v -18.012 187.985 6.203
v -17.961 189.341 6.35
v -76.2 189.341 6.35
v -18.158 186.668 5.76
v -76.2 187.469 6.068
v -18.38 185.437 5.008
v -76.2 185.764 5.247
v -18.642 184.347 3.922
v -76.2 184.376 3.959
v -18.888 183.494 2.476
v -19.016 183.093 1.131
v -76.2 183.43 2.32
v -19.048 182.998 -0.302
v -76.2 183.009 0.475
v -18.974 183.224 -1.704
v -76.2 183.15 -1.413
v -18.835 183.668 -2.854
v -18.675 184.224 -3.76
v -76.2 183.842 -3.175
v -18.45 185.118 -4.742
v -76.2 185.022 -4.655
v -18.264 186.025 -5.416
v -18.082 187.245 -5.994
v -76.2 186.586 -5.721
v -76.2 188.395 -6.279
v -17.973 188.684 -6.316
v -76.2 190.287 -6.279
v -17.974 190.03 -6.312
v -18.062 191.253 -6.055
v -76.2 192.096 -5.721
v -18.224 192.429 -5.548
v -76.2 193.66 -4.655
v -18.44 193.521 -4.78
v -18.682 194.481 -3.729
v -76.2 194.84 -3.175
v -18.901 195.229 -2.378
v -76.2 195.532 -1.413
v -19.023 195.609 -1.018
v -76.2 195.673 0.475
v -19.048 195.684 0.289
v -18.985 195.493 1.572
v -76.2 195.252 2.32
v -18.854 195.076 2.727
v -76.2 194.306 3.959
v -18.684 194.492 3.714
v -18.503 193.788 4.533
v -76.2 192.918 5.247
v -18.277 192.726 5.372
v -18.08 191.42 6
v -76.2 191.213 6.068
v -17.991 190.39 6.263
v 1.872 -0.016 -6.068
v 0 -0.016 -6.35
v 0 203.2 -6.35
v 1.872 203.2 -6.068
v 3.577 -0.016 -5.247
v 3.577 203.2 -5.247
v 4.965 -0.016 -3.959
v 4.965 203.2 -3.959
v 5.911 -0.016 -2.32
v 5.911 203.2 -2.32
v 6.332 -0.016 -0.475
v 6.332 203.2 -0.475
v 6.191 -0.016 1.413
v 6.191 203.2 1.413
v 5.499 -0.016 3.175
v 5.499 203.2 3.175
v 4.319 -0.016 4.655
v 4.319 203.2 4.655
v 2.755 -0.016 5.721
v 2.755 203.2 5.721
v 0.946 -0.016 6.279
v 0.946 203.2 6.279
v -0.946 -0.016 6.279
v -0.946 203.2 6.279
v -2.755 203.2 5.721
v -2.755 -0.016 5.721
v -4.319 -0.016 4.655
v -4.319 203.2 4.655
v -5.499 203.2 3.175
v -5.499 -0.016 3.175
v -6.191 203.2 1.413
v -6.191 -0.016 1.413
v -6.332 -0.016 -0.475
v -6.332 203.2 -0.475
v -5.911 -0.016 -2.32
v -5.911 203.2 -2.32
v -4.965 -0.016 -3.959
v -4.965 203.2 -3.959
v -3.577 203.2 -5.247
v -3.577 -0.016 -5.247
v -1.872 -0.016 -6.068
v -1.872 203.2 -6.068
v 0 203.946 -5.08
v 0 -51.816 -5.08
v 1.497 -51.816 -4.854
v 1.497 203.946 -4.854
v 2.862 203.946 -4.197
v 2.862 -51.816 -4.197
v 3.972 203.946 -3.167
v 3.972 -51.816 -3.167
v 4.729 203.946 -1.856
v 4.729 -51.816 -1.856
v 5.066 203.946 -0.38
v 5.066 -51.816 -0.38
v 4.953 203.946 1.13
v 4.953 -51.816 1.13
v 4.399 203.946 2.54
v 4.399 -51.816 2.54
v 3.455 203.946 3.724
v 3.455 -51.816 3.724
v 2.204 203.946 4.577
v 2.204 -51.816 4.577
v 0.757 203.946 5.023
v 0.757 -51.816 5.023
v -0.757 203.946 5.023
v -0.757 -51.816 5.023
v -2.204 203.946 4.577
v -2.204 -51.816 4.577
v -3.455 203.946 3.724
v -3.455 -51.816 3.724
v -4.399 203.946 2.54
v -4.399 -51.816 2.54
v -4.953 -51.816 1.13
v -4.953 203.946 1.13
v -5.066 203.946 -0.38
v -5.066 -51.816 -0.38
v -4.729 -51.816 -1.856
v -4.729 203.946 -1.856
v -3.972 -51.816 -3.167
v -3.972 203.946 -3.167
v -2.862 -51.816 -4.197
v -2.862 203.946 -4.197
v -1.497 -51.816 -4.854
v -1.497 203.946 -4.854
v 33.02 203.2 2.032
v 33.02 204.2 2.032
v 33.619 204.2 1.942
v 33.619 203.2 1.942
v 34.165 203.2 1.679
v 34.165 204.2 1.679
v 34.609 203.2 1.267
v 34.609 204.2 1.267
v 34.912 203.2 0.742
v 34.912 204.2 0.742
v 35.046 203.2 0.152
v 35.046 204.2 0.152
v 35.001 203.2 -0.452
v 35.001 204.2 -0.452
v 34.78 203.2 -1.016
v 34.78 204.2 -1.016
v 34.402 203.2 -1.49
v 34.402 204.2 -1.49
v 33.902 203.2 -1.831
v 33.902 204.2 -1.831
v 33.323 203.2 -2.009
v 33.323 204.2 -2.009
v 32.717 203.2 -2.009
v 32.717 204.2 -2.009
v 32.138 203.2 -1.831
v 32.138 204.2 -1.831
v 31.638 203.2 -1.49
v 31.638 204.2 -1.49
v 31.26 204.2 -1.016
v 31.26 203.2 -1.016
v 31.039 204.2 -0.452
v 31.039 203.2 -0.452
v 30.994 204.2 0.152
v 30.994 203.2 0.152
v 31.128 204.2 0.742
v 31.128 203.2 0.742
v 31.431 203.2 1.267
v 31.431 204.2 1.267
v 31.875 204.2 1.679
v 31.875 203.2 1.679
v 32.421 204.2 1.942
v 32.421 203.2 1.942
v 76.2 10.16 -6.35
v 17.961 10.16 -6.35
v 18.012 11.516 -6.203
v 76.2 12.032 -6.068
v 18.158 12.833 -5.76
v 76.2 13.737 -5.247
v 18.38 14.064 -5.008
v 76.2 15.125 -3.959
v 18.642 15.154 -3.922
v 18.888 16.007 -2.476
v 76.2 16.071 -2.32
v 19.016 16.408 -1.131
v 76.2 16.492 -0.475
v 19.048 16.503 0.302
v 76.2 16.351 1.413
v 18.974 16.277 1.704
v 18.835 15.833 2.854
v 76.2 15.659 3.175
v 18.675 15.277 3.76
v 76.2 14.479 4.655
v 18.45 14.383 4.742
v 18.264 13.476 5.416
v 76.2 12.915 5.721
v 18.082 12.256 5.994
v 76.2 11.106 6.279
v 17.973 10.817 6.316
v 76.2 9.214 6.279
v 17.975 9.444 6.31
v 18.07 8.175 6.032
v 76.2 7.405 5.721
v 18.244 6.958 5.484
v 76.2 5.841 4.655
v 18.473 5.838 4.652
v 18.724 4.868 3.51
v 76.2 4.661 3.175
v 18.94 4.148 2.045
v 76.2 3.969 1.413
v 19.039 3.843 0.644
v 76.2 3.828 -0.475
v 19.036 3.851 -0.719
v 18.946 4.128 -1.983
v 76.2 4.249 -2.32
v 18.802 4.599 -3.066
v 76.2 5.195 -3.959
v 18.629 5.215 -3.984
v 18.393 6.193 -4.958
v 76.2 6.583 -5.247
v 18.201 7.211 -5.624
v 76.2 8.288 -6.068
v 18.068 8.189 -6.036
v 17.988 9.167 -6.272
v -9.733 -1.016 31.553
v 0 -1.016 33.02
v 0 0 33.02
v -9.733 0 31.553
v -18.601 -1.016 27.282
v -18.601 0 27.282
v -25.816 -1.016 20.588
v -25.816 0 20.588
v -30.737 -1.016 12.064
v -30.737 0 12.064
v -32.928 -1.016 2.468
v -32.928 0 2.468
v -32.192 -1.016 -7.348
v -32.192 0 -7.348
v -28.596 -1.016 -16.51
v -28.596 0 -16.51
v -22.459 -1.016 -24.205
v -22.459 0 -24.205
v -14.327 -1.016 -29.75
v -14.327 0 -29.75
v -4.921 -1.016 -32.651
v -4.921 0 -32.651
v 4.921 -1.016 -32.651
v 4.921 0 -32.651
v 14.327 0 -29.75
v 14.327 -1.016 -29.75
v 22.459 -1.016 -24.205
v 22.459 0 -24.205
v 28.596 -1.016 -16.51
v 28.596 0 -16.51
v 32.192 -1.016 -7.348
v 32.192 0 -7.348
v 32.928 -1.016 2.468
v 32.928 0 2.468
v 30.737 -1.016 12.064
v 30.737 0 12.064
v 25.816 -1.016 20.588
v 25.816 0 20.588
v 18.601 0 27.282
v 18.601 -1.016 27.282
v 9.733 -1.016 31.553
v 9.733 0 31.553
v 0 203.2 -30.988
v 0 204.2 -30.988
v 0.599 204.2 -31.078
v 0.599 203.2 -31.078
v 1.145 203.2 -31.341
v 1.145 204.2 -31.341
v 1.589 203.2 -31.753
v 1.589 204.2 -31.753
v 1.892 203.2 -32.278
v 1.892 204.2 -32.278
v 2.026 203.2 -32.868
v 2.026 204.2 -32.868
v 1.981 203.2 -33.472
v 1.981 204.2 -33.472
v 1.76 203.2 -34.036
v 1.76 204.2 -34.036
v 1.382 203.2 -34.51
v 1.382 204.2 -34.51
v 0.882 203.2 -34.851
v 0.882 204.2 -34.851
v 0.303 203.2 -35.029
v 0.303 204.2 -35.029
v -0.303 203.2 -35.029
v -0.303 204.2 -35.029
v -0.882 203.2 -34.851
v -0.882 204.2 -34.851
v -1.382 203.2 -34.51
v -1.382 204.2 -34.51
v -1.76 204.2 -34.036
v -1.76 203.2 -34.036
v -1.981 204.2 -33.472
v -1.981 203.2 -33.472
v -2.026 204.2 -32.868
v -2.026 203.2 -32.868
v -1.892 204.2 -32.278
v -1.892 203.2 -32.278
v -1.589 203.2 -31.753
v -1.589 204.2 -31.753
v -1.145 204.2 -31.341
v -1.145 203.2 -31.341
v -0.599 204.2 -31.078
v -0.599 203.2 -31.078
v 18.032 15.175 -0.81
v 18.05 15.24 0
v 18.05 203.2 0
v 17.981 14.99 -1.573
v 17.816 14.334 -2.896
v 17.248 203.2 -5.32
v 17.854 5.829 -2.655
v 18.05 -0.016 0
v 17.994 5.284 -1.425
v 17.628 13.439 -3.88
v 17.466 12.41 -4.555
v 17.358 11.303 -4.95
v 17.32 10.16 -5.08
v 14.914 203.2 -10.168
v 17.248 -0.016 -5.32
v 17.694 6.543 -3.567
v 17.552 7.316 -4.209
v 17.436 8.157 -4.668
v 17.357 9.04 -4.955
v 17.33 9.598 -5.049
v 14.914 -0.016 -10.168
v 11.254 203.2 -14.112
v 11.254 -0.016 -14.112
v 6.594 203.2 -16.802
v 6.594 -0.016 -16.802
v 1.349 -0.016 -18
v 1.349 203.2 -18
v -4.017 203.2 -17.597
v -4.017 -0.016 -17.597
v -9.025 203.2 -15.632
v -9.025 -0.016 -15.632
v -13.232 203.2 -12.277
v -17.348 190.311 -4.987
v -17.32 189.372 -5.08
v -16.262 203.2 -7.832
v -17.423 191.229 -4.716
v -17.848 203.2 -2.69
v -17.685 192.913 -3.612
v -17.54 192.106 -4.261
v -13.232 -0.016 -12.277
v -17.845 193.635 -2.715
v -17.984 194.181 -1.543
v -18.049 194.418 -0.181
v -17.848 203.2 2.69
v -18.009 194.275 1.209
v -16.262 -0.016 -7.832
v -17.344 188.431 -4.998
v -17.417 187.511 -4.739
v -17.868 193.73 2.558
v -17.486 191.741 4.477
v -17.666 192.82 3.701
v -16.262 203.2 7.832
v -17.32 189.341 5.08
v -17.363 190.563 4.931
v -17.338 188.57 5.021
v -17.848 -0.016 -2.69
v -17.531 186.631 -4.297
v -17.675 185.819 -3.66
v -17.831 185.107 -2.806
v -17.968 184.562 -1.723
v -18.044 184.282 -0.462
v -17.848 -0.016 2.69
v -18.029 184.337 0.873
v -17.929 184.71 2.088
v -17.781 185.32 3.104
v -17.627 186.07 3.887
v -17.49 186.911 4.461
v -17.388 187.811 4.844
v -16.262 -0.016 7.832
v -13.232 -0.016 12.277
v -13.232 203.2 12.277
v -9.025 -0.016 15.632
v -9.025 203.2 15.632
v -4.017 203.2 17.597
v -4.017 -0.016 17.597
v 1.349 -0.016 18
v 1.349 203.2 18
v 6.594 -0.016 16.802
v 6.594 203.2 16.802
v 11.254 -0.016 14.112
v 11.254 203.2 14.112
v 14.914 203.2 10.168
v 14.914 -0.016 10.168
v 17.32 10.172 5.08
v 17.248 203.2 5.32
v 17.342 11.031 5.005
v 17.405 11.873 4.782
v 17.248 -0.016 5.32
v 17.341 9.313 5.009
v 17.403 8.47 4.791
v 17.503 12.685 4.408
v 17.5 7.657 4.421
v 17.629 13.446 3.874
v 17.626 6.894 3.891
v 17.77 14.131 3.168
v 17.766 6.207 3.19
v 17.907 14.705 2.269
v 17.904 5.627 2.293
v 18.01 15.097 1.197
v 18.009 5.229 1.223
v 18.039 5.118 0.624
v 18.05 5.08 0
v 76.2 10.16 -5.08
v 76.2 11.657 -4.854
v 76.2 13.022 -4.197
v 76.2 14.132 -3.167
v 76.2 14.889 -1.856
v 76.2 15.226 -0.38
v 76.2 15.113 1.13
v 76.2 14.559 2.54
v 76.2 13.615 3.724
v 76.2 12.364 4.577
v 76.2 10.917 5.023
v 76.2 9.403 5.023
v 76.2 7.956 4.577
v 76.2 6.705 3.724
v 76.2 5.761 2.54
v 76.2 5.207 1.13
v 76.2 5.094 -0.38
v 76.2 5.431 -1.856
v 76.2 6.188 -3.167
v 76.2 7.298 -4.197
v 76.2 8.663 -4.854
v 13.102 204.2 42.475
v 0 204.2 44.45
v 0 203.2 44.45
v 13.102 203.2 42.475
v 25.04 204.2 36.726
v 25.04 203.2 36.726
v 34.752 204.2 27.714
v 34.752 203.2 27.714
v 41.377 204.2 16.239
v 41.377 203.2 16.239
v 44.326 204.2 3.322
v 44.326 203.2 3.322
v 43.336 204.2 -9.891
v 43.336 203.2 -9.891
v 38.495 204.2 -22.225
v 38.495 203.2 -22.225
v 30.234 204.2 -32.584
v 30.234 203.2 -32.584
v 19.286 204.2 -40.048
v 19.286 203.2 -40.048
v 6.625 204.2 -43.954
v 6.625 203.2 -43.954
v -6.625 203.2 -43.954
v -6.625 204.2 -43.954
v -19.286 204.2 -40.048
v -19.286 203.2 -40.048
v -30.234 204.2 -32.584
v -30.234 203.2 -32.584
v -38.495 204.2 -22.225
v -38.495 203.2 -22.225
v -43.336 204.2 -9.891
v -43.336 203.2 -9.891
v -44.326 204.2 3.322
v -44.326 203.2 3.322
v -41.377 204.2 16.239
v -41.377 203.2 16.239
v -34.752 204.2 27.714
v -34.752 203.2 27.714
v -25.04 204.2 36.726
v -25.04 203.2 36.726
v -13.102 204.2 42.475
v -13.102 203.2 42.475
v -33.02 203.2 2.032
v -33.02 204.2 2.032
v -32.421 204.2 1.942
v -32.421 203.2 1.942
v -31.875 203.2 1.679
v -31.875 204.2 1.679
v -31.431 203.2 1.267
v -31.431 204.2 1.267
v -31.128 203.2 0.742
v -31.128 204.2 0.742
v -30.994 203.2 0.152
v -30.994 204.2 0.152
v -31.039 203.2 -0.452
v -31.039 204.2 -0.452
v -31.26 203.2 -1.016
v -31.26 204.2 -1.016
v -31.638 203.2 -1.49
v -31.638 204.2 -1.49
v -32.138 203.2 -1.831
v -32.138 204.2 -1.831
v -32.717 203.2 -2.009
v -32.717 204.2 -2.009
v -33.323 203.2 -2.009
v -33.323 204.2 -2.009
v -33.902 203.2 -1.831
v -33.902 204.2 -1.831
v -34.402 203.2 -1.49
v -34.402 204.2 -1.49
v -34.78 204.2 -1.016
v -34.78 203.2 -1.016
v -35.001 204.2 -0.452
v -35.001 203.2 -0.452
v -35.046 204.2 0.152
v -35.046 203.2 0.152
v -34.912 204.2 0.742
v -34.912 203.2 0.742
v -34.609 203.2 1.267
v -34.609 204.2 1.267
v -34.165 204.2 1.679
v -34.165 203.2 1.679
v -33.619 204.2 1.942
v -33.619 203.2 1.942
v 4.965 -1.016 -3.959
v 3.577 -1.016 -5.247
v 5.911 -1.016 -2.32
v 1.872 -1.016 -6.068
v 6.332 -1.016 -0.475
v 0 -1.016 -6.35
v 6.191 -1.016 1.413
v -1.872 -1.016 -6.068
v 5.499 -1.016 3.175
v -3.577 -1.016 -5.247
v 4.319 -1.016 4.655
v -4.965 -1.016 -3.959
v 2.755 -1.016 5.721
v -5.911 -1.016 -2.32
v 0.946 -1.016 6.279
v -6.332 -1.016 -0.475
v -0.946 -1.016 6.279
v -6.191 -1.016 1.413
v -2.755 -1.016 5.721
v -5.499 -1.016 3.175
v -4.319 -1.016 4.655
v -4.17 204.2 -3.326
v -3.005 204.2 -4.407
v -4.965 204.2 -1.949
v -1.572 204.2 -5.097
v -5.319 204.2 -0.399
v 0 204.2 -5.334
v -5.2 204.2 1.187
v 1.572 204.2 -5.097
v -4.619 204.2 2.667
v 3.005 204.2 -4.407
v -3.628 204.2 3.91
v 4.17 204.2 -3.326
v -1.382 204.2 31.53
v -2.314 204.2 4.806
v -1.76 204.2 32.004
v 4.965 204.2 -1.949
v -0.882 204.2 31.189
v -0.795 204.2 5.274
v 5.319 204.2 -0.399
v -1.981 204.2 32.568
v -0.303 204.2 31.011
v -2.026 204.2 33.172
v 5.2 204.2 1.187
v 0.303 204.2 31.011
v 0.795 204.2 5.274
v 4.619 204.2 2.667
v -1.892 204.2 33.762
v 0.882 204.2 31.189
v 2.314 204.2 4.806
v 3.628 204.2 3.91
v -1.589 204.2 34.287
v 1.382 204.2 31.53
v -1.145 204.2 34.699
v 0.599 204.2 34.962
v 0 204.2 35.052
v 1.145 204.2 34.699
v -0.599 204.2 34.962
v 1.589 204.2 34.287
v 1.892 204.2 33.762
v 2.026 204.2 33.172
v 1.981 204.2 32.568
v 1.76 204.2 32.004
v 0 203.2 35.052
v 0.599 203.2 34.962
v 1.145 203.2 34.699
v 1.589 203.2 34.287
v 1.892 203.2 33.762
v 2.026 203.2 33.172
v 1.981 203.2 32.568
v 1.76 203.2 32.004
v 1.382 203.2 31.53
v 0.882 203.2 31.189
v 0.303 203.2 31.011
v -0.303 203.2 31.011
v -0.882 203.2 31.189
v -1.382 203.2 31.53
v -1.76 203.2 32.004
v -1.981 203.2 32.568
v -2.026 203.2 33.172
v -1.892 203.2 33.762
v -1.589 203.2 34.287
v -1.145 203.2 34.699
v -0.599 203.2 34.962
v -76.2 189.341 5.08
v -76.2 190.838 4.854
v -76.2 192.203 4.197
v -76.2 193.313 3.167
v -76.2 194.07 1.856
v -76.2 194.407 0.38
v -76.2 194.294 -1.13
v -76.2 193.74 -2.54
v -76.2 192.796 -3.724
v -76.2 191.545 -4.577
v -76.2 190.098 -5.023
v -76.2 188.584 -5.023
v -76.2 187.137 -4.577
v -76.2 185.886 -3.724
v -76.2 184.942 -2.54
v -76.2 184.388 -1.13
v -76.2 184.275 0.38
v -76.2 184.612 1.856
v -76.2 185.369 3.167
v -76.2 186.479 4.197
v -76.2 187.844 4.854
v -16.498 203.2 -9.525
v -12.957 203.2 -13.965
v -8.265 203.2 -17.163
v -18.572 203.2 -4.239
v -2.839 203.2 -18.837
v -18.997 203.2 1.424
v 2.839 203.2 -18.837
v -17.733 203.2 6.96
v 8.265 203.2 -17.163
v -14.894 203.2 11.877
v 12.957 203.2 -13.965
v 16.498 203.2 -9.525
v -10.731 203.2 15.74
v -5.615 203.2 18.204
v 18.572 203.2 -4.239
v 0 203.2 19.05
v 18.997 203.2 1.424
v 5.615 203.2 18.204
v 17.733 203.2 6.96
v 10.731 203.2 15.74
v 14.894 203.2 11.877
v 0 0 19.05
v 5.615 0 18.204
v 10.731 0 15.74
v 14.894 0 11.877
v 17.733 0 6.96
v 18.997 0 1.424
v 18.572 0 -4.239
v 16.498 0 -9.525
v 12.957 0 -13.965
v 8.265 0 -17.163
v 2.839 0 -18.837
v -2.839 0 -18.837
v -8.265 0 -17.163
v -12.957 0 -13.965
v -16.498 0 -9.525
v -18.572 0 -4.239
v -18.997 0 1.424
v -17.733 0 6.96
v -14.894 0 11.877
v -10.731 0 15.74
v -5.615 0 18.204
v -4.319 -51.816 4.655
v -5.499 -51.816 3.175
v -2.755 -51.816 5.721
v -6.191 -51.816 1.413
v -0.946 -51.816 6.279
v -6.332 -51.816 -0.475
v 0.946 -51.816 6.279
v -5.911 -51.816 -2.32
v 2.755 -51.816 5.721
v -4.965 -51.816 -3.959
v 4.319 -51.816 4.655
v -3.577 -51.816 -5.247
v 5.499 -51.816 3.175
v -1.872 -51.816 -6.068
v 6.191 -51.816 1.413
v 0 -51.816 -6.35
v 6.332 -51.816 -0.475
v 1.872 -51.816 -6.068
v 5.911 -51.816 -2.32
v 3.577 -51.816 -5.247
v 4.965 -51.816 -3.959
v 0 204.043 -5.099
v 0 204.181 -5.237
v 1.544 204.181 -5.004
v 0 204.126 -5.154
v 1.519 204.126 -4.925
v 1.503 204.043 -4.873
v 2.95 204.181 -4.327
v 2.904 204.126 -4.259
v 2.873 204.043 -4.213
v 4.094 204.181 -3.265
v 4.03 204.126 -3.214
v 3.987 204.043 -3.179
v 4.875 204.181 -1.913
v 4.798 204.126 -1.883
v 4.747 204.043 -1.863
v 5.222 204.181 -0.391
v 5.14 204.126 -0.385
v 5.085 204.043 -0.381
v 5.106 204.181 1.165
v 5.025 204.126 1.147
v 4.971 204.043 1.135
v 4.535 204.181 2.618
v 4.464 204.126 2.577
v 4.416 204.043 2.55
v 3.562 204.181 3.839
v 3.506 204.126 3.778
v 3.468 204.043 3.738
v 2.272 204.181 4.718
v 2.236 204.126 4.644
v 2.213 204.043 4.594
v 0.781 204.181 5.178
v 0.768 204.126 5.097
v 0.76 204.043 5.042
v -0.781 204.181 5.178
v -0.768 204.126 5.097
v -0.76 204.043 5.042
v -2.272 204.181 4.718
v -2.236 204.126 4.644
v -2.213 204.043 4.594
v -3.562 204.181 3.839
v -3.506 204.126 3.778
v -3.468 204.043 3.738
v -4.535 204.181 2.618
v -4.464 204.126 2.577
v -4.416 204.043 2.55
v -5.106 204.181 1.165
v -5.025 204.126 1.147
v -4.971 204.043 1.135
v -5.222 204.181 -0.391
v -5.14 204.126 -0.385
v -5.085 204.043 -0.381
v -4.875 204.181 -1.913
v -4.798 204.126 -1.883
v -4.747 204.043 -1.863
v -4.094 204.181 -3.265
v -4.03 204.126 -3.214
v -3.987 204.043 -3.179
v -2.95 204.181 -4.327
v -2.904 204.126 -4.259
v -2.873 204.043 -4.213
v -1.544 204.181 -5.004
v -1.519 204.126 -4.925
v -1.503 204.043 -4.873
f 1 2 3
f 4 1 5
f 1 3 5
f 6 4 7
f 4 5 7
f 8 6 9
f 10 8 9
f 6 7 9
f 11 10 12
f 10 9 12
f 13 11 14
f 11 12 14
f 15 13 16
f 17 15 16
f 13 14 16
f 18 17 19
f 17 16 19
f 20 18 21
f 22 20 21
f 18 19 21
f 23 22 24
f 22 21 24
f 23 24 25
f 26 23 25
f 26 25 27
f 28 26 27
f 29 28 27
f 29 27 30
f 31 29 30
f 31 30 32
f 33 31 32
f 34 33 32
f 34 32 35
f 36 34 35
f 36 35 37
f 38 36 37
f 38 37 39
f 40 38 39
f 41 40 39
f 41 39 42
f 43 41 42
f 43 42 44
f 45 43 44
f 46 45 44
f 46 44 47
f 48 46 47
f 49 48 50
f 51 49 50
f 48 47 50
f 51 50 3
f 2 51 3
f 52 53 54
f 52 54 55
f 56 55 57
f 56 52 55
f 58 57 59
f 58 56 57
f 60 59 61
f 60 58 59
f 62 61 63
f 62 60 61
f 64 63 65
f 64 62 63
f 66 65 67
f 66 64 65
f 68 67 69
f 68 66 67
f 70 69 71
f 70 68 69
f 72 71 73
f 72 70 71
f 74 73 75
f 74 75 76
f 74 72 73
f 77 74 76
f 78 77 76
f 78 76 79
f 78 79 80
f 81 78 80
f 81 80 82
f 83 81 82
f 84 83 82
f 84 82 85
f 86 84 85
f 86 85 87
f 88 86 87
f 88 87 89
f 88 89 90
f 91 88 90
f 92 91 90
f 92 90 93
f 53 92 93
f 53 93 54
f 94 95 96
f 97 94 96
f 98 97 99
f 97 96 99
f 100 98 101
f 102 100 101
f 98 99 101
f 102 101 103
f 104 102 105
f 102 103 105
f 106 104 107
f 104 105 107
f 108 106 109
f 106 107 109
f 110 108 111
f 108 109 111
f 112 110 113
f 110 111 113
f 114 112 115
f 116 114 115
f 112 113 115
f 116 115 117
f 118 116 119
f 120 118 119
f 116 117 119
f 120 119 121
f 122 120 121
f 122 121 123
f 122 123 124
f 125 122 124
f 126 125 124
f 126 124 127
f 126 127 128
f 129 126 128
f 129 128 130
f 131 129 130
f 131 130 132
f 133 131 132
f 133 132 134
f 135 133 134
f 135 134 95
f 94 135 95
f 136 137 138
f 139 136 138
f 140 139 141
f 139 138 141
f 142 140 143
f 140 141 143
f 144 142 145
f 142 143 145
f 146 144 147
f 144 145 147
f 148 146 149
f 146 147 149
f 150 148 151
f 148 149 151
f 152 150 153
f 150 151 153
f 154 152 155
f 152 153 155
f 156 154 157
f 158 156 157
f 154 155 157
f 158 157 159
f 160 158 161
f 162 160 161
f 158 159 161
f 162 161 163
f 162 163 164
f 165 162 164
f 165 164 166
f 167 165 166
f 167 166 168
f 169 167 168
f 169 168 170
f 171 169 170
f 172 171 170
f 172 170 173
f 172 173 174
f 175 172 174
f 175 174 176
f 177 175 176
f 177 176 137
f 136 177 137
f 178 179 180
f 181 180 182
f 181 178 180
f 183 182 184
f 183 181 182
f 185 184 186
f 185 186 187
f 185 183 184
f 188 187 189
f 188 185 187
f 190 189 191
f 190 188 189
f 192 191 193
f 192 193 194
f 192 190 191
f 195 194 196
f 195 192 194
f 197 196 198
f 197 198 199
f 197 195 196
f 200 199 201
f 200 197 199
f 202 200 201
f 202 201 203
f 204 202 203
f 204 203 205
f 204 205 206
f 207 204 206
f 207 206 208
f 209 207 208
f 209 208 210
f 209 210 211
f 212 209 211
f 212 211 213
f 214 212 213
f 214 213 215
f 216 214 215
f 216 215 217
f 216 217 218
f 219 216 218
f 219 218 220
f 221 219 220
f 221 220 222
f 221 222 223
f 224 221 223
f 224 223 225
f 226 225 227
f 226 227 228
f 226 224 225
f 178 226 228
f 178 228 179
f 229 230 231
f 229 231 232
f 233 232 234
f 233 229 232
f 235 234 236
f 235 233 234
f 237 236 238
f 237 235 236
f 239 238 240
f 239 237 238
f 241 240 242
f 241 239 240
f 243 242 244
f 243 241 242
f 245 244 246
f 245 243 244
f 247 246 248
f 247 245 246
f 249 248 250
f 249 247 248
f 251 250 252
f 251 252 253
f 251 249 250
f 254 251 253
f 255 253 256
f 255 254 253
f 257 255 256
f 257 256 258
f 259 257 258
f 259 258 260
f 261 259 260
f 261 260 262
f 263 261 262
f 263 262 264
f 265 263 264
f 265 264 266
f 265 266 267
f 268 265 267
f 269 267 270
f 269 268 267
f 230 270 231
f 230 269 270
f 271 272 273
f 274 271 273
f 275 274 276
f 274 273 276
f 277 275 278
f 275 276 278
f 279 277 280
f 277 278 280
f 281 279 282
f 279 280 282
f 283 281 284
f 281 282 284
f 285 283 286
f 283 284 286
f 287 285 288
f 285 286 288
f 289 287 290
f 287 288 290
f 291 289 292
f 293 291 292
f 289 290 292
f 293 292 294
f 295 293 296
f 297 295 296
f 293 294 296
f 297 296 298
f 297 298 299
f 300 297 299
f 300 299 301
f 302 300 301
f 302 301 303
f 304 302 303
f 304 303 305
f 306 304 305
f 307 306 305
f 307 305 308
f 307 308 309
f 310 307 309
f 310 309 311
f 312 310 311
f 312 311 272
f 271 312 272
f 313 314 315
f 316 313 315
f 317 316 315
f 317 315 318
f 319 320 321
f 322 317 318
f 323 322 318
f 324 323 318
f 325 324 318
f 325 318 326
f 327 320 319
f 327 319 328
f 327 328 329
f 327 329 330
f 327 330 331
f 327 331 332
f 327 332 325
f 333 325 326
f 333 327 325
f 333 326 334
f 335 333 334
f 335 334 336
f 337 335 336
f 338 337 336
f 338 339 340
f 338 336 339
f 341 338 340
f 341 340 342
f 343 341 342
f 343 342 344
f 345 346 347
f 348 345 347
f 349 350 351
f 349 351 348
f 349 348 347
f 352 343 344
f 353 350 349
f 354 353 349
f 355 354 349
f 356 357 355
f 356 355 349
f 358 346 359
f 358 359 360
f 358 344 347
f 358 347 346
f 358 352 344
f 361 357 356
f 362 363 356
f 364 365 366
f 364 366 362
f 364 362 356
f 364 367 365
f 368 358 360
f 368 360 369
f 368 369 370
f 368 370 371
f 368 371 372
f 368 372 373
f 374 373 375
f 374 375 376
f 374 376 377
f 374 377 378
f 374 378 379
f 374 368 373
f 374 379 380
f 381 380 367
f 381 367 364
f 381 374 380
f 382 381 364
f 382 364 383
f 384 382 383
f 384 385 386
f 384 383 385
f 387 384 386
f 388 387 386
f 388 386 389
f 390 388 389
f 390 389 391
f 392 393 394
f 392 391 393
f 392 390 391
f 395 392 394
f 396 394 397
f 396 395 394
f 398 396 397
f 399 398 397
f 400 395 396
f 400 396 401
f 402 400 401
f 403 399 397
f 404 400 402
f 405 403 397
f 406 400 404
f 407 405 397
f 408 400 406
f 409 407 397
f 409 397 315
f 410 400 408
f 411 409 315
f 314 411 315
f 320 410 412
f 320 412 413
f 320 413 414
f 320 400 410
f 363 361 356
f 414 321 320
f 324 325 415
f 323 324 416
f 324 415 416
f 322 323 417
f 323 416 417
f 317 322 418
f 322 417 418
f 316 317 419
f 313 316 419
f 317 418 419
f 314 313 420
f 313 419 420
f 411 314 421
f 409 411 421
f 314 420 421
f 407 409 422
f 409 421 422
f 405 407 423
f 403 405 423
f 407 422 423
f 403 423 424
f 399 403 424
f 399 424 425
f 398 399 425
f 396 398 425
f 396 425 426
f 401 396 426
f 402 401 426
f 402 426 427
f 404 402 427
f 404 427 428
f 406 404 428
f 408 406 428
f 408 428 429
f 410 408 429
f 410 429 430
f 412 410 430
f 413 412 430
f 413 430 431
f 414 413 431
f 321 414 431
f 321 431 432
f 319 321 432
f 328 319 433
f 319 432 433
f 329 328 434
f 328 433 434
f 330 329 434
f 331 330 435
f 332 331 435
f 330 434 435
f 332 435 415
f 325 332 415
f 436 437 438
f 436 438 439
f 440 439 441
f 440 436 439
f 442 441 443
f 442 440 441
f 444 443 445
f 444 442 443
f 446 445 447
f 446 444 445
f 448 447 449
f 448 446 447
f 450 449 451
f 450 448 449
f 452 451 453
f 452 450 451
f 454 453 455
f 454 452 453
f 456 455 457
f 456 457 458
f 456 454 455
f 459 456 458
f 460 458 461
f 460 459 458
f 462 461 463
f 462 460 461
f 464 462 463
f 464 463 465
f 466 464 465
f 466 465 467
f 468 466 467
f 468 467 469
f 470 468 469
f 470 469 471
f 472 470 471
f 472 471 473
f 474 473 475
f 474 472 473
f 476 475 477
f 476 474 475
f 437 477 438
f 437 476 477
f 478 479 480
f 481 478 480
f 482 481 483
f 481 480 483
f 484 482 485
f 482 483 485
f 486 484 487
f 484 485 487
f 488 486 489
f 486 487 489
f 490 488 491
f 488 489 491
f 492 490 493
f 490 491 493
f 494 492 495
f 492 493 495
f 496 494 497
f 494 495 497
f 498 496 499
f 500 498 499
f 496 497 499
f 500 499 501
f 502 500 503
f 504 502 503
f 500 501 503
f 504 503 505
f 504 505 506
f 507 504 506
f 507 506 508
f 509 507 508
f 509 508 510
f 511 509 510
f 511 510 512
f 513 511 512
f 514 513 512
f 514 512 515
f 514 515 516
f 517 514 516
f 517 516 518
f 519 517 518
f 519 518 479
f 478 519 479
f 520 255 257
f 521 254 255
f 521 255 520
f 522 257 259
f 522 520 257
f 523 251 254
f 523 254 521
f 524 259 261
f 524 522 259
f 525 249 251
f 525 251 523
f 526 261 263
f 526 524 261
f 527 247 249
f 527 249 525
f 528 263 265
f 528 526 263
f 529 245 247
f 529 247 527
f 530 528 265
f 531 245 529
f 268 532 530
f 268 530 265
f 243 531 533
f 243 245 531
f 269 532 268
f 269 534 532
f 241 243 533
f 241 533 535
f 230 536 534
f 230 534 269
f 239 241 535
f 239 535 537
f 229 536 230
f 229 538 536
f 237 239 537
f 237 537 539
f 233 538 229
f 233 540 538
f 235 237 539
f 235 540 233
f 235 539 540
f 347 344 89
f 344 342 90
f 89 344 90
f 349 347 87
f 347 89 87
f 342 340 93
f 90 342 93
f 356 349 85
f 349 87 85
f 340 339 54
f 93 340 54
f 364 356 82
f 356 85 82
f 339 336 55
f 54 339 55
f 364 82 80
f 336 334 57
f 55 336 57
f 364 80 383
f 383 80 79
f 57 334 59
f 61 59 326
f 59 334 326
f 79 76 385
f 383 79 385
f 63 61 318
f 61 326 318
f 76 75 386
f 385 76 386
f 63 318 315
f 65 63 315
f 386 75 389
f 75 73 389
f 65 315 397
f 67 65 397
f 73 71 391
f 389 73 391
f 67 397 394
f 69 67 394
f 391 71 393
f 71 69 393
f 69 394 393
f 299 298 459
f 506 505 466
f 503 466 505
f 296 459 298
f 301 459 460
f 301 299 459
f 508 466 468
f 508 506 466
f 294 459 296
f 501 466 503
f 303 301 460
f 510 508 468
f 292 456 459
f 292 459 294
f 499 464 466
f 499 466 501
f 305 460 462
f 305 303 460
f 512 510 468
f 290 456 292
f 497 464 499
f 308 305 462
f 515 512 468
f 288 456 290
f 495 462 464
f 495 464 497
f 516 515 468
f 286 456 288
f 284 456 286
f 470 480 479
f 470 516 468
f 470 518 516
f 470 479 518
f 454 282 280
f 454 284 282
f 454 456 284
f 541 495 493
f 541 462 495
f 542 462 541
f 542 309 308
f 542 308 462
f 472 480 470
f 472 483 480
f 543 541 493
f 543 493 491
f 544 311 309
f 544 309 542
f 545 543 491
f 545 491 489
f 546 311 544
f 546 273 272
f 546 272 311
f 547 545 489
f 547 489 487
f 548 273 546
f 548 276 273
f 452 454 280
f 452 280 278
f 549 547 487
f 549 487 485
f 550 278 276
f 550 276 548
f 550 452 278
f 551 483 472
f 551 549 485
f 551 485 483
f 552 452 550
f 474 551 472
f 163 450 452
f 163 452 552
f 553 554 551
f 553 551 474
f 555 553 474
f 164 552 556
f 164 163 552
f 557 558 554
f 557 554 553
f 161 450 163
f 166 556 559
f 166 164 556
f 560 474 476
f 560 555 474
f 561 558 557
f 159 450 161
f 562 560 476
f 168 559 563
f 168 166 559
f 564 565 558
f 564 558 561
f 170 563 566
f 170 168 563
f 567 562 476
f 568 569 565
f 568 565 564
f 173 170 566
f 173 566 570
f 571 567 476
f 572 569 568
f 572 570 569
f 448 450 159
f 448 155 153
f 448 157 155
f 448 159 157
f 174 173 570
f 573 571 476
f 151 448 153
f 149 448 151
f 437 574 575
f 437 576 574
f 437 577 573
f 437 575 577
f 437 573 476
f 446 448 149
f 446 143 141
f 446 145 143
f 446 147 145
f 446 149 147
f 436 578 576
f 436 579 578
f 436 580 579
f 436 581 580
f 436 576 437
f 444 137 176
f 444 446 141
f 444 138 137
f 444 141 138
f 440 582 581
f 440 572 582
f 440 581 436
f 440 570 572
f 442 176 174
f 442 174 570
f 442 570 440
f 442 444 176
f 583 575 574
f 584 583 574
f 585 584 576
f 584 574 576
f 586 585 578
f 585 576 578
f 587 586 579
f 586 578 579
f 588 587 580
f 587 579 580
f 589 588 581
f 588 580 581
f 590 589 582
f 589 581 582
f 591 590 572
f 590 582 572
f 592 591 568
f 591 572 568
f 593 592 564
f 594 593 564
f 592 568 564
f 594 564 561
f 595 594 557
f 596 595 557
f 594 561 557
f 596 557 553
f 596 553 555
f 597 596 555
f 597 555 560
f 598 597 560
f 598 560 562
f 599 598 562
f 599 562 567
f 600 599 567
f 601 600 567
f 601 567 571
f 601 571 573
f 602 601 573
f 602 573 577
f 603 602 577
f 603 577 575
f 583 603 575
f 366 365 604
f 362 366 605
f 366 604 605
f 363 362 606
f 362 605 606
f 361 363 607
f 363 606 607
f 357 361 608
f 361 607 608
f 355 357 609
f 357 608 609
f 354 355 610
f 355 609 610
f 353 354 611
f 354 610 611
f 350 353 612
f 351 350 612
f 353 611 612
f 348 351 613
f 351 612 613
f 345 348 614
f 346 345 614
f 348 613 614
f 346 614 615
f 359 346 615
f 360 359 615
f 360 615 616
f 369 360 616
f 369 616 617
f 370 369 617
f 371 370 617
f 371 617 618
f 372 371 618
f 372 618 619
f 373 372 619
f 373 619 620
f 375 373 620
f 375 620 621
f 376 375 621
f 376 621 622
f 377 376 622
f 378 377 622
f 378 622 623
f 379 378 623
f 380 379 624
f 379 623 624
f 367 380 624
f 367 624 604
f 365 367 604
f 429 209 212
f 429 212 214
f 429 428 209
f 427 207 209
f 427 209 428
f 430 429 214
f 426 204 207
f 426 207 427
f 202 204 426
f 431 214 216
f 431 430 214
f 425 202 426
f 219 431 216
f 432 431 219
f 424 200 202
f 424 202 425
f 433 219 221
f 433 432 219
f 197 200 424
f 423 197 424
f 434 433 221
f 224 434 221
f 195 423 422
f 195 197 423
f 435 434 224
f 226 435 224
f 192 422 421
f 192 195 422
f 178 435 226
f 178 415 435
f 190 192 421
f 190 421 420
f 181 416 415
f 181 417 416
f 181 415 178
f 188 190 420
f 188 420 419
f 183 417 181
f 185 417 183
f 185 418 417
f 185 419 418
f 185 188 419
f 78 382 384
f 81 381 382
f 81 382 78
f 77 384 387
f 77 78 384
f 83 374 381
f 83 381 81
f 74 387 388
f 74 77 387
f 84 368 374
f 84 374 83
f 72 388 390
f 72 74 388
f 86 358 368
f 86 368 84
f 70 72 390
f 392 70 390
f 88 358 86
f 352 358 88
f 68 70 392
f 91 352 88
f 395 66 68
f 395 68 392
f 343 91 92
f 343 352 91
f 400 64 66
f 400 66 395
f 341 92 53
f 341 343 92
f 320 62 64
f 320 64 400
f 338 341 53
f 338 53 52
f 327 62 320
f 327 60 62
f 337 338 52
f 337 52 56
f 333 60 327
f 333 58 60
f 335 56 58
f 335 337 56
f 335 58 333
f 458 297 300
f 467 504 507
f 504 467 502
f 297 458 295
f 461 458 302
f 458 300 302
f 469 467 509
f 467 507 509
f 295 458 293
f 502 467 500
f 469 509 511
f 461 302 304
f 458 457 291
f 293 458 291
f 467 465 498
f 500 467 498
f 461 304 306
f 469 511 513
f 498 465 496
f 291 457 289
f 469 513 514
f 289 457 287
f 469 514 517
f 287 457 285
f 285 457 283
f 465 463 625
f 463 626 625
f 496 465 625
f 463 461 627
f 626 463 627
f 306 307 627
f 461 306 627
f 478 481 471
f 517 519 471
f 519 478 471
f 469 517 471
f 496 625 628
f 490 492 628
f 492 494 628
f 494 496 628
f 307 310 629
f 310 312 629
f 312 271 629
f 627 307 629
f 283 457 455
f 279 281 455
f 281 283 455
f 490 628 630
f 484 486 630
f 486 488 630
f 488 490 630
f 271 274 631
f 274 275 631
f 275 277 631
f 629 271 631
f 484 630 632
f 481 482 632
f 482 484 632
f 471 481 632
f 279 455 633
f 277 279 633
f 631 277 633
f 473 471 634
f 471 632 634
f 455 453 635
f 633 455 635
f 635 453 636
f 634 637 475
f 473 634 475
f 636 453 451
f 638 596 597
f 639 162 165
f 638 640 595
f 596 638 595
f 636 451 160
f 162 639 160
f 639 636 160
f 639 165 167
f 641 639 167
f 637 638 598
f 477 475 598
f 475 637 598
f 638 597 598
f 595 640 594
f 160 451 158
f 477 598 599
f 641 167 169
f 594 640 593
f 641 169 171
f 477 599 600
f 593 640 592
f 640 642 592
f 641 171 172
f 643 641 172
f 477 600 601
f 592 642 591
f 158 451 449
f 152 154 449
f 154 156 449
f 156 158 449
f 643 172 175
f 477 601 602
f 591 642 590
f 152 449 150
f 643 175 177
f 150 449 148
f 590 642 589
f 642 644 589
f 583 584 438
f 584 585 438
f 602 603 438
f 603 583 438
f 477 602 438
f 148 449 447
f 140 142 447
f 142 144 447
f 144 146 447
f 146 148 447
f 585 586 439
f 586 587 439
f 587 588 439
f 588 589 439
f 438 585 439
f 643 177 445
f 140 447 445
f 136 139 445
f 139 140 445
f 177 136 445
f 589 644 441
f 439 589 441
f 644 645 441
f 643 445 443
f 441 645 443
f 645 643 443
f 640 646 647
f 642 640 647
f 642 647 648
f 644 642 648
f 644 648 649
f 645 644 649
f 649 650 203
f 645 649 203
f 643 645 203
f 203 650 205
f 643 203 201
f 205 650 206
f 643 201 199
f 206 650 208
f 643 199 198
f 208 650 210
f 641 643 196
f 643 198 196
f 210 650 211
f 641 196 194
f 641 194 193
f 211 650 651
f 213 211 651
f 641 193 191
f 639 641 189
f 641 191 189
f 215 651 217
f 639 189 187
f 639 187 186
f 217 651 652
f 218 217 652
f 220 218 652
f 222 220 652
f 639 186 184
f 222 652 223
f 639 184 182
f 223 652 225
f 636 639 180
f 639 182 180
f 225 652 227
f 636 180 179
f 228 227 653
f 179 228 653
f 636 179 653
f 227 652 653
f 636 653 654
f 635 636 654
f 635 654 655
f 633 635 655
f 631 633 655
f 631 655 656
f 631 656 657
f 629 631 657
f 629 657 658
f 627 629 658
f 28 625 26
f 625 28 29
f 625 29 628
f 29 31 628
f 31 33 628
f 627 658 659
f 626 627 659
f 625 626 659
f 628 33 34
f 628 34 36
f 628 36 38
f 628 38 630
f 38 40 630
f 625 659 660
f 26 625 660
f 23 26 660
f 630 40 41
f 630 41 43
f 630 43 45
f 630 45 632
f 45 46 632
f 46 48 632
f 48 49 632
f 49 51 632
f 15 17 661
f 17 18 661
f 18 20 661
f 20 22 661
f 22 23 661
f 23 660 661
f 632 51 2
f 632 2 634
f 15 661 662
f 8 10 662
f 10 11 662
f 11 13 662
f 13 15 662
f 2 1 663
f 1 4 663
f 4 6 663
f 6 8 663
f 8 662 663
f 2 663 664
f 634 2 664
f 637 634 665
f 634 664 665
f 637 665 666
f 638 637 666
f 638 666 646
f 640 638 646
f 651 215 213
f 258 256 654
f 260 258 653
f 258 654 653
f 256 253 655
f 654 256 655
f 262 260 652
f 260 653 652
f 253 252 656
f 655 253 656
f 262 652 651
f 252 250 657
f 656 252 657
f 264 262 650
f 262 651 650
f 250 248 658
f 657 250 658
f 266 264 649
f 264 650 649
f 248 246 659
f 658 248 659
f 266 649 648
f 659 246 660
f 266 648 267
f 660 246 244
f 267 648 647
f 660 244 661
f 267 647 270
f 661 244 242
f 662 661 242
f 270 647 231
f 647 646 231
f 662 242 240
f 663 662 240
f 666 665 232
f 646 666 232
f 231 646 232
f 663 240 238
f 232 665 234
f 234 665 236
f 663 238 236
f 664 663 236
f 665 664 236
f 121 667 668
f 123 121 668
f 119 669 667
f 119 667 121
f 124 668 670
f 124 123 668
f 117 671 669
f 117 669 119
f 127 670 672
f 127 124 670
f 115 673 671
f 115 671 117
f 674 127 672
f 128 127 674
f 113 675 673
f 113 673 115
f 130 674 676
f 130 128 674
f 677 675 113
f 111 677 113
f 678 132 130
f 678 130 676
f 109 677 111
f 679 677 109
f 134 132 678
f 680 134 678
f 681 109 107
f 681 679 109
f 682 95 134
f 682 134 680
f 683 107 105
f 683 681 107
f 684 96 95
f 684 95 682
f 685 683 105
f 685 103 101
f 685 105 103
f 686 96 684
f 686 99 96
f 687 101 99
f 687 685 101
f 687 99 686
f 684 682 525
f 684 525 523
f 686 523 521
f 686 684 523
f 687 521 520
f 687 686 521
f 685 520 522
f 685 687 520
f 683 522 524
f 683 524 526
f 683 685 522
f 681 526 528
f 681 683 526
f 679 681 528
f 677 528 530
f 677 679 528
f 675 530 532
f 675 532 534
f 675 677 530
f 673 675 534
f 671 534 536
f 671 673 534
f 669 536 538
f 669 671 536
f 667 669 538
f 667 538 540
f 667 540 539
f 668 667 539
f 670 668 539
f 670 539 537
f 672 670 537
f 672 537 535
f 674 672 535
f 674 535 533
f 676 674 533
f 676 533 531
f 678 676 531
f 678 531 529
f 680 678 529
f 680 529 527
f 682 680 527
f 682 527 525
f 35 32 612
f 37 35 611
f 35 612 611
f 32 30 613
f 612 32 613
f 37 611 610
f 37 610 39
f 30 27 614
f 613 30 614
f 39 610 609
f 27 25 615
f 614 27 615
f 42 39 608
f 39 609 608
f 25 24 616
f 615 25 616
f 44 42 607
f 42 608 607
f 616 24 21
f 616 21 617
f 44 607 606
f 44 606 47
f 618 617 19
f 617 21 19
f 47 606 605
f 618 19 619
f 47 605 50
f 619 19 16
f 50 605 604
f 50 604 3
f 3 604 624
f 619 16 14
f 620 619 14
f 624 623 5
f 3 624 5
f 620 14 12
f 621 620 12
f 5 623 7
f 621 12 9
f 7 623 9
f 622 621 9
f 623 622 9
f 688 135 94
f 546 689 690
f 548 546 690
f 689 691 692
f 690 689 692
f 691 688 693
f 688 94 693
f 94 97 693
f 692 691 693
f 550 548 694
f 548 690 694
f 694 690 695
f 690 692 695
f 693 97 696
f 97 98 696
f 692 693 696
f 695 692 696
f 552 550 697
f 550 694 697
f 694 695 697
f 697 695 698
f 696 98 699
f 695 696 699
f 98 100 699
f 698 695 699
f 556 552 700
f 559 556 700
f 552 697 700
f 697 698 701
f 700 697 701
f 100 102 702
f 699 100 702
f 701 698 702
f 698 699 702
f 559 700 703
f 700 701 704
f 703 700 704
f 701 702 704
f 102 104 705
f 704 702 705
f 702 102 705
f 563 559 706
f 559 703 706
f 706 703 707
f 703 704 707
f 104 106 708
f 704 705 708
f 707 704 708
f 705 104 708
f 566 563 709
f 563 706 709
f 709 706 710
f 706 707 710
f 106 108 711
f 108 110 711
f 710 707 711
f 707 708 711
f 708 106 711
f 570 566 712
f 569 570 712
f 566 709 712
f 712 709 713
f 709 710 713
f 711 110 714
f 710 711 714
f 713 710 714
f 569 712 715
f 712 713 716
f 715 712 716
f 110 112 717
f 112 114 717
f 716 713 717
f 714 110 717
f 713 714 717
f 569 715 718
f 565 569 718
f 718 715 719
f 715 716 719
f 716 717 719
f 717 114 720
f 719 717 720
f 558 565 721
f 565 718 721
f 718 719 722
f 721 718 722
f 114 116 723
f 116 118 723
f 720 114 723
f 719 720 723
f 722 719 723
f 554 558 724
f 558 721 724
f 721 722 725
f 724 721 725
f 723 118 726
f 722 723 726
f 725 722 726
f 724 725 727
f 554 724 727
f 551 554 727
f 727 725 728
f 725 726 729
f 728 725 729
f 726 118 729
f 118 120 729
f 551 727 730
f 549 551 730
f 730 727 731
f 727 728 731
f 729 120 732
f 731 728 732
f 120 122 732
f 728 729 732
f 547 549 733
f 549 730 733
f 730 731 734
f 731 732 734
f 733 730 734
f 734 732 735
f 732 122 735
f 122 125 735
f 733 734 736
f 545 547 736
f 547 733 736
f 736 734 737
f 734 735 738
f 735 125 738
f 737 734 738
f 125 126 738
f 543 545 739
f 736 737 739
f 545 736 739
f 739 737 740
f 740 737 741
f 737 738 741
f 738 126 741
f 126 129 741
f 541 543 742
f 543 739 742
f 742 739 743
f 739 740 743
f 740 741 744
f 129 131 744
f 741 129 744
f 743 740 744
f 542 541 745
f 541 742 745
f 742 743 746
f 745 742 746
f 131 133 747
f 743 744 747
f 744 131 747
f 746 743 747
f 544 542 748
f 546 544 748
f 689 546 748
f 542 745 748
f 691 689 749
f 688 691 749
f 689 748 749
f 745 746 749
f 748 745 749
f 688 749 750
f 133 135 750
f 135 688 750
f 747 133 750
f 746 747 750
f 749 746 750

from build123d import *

# Parameters (mm, degrees)
SKETCH1_R                = 19.05
BOSS_EXTRUDE1_DEPTH      = 203.2
SKETCH2_R                = 33.02
BOSS_EXTRUDE2_DEPTH      = 1
BOSS_EXTRUDE3_START      = 1.016
SKETCH3_R                = 33.02
BOSS_EXTRUDE3_DEPTH      = 1.016
SHELL2_START             = -0.016
SHELL2_OUTLINE_R         = 18.05
SHELL2_DEPTH             = 204.216
BOSS_EXTRUDE4_REACH      = 235.917
BOSS_EXTRUDE4_END_RADIUS = 19.05
SKETCH4_R                = 6.35
CUT_EXTRUDE1_REACH       = 235.917
CUT_EXTRUDE1_END_RADIUS  = 18.05
SKETCH5_R                = 5.08
BOSS_EXTRUDE5_REACH      = 258.931
BOSS_EXTRUDE5_END_RADIUS = 19.05
SKETCH6_R                = 6.35
CUT_EXTRUDE3_REACH       = 223.383
SKETCH8_R                = 4
BOSS_EXTRUDE6_START      = 50.8
SKETCH9_R                = 6.35
BOSS_EXTRUDE6_DEPTH      = 255.016
CUT_EXTRUDE2_REACH       = 258.931
CUT_EXTRUDE2_END_RADIUS  = 18.05
SKETCH7_R                = 5.08
SKETCH11_R               = 44.45
BOSS_EXTRUDE7_DEPTH      = 1
CUT_EXTRUDE5_REACH       = 272.789
SKETCH13_R               = 2.032
CUT_EXTRUDE6_REACH       = 272.789
SKETCH15_R               = 5.08
FILLET1_R                = 0.254


# Read off the part's stored shape, not the designer's step: Shell2
with BuildPart() as part:
    # Sketch1 → Boss-Extrude1 (new body)
    with BuildSketch(Plane(origin=(0, 0, 0), x_dir=(1, 0, 0), z_dir=(0, 1, 0))):
        with Locations(Location((0, 0, 0), (0, 0, 270))):
            Circle(SKETCH1_R)
    extrude(amount=BOSS_EXTRUDE1_DEPTH)

    # Sketch2 → Boss-Extrude2 (add)
    with BuildSketch(Plane(origin=(0, 203.2, 0), x_dir=(1, 0, 0), z_dir=(0, 1, 0))):
        with Locations(Location((0, 0, 0), (0, 0, 270))):
            Circle(SKETCH2_R)
    extrude(amount=BOSS_EXTRUDE2_DEPTH)

    # Sketch3 → Boss-Extrude3 (add)
    with BuildSketch(Plane.XZ.offset(BOSS_EXTRUDE3_START)):
        with Locations(Location((0, 0, 0), (0, 0, 90))):
            Circle(SKETCH3_R)
    extrude(amount=-BOSS_EXTRUDE3_DEPTH)

    # Shell2 outline → Shell2 (cut)
    with BuildSketch(Plane(origin=(0, 0, 0), x_dir=(1, 0, 0), z_dir=(0, 1, 0)).offset(SHELL2_START)):
        Circle(SHELL2_OUTLINE_R)
    extrude(amount=SHELL2_DEPTH, mode=Mode.SUBTRACT)

    # Boss-Extrude4: up to this cylinder (the profile starts outside it)
    boss_extrude4_end = Plane(origin=(0, 189.341, 0), z_dir=(0, -1, 0)) * Cylinder(BOSS_EXTRUDE4_END_RADIUS, 510.934, mode=Mode.PRIVATE)
    # Sketch4 → Boss-Extrude4 (add, up to the surface)
    with BuildSketch(Plane(origin=(-76.2, 0, 0), x_dir=(0, 0, -1), z_dir=(1, 0, 0)), mode=Mode.PRIVATE) as boss_extrude4_sk1:
        with Locations(Location((0, 189.341, 0), (0, 0, 180))):
            Circle(SKETCH4_R)
    boss_extrude4_tool1 = extrude(boss_extrude4_sk1.sketch, amount=BOSS_EXTRUDE4_REACH, mode=Mode.PRIVATE) - boss_extrude4_end
    add(boss_extrude4_tool1.solids().sort_by_distance((-76.2, 189.341, 0))[0])

    # Cut-Extrude1: up to this cylinder (the profile starts outside it)
    cut_extrude1_end = Plane(origin=(0, 189.341, 0), z_dir=(0, -1, 0)) * Cylinder(CUT_EXTRUDE1_END_RADIUS, 508.934, mode=Mode.PRIVATE)
    # Sketch5 → Cut-Extrude1 (cut, up to the surface)
    with BuildSketch(Plane.ZY.offset(76.2), mode=Mode.PRIVATE) as cut_extrude1_sk1:
        with Locations((0, 189.341)):
            Circle(SKETCH5_R)
    cut_extrude1_tool1 = extrude(cut_extrude1_sk1.sketch, amount=-CUT_EXTRUDE1_REACH, mode=Mode.PRIVATE) - cut_extrude1_end
    add(cut_extrude1_tool1.solids().sort_by_distance((-76.2, 189.341, 0))[0], mode=Mode.SUBTRACT)

    # Boss-Extrude5: up to this cylinder (the profile starts outside it)
    boss_extrude5_end = Plane(origin=(0, 10.16, 0), z_dir=(0, -1, 0)) * Cylinder(BOSS_EXTRUDE5_END_RADIUS, 556.962, mode=Mode.PRIVATE)
    # Sketch6 → Boss-Extrude5 (add, up to the surface)
    with BuildSketch(Plane(origin=(76.2, 0, 0), x_dir=(0, 0, -1), z_dir=(1, 0, 0)), mode=Mode.PRIVATE) as boss_extrude5_sk1:
        with Locations((0, 10.16)):
            Circle(SKETCH6_R)
    boss_extrude5_tool1 = extrude(boss_extrude5_sk1.sketch, amount=-BOSS_EXTRUDE5_REACH, mode=Mode.PRIVATE) - boss_extrude5_end
    add(boss_extrude5_tool1.solids().sort_by_distance((76.2, 10.16, 0))[0])

    # Sketch8 → Cut-Extrude3 (cut, up to next)
    with BuildSketch(Plane.XZ.offset(1.016), mode=Mode.PRIVATE) as cut_extrude3_sk1:
        with Locations(Location((0, 0, 0), (0, 0, 270))):
            Circle(SKETCH8_R)
    cut_extrude3_tool1 = extrude(cut_extrude3_sk1.sketch, amount=-CUT_EXTRUDE3_REACH, mode=Mode.PRIVATE) & part.part
    add(cut_extrude3_tool1.solids().sort_by_distance((0, -1.016, 0))[0], mode=Mode.SUBTRACT)

    # Sketch9 → Boss-Extrude6 (add)
    with BuildSketch(Plane.XZ.offset(1.016).offset(BOSS_EXTRUDE6_START)):
        with Locations(Location((0, 0, 0), (0, 0, 270))):
            Circle(SKETCH9_R)
    extrude(amount=-BOSS_EXTRUDE6_DEPTH)

    # Cut-Extrude2: up to this cylinder (the profile starts outside it)
    cut_extrude2_end = Plane(origin=(0, 10.16, 0), z_dir=(0, -1, 0)) * Cylinder(CUT_EXTRUDE2_END_RADIUS, 554.962, mode=Mode.PRIVATE)
    # Sketch7 → Cut-Extrude2 (cut, up to the surface)
    with BuildSketch(Plane(origin=(76.2, 0, 0), x_dir=(0, 0, -1), z_dir=(1, 0, 0)), mode=Mode.PRIVATE) as cut_extrude2_sk1:
        with Locations((0, 10.16)):
            Circle(SKETCH7_R)
    cut_extrude2_tool1 = extrude(cut_extrude2_sk1.sketch, amount=-CUT_EXTRUDE2_REACH, mode=Mode.PRIVATE) - cut_extrude2_end
    add(cut_extrude2_tool1.solids().sort_by_distance((76.2, 10.16, 0))[0], mode=Mode.SUBTRACT)

    # Sketch11 → Boss-Extrude7 (add)
    with BuildSketch(Plane(origin=(0, 204.2, 0), x_dir=(1, 0, 0), z_dir=(0, 1, 0))):
        with Locations(Location((0, 0, 0), (0, 0, 270))):
            Circle(SKETCH11_R)
    extrude(amount=-BOSS_EXTRUDE7_DEPTH)

    # Sketch13 → Cut-Extrude5 (cut, up to next)
    with BuildSketch(Plane(origin=(0, 204.2, 0), x_dir=(1, 0, 0), z_dir=(0, 1, 0)), mode=Mode.PRIVATE) as cut_extrude5_sk1:
        with Locations(Location((33.02, 0, 0), (0, 0, 270))):
            Circle(SKETCH13_R)
    cut_extrude5_tool1 = extrude(cut_extrude5_sk1.sketch, amount=-CUT_EXTRUDE5_REACH, mode=Mode.PRIVATE) & part.part
    # Sketch13 → Cut-Extrude5 (cut, up to next)
    with BuildSketch(Plane(origin=(0, 204.2, 0), x_dir=(1, 0, 0), z_dir=(0, 1, 0)), mode=Mode.PRIVATE) as cut_extrude5_sk2:
        with Locations(Location((0, -33.02, 0), (0, 0, 270))):
            Circle(SKETCH13_R)
    cut_extrude5_tool2 = extrude(cut_extrude5_sk2.sketch, amount=-CUT_EXTRUDE5_REACH, mode=Mode.PRIVATE) & part.part
    # Sketch13 → Cut-Extrude5 (cut, up to next)
    with BuildSketch(Plane(origin=(0, 204.2, 0), x_dir=(1, 0, 0), z_dir=(0, 1, 0)), mode=Mode.PRIVATE) as cut_extrude5_sk3:
        with Locations(Location((-33.02, 0, 0), (0, 0, 270))):
            Circle(SKETCH13_R)
    cut_extrude5_tool3 = extrude(cut_extrude5_sk3.sketch, amount=-CUT_EXTRUDE5_REACH, mode=Mode.PRIVATE) & part.part
    # Sketch13 → Cut-Extrude5 (cut, up to next)
    with BuildSketch(Plane(origin=(0, 204.2, 0), x_dir=(1, 0, 0), z_dir=(0, 1, 0)), mode=Mode.PRIVATE) as cut_extrude5_sk4:
        with Locations(Location((0, 33.02, 0), (0, 0, 270))):
            Circle(SKETCH13_R)
    cut_extrude5_tool4 = extrude(cut_extrude5_sk4.sketch, amount=-CUT_EXTRUDE5_REACH, mode=Mode.PRIVATE) & part.part
    add(cut_extrude5_tool1.solids().sort_by_distance((33.02, 204.2, 0))[0], mode=Mode.SUBTRACT)
    add(cut_extrude5_tool2.solids().sort_by_distance((0, 204.2, 33.02))[0], mode=Mode.SUBTRACT)
    add(cut_extrude5_tool3.solids().sort_by_distance((-33.02, 204.2, 0))[0], mode=Mode.SUBTRACT)
    add(cut_extrude5_tool4.solids().sort_by_distance((0, 204.2, -33.02))[0], mode=Mode.SUBTRACT)

    # Sketch15 → Cut-Extrude6 (cut, up to next)
    with BuildSketch(Plane.XZ.offset(51.816), mode=Mode.PRIVATE) as cut_extrude6_sk1:
        with Locations(Location((0, 0, 0), (0, 0, 270))):
            Circle(SKETCH15_R)
    cut_extrude6_tool1 = extrude(cut_extrude6_sk1.sketch, amount=-CUT_EXTRUDE6_REACH, mode=Mode.PRIVATE) & part.part
    add(cut_extrude6_tool1.solids().sort_by_distance((0, -51.816, 0))[0], mode=Mode.SUBTRACT)

    # Fillet1
    fillet1_edges = [part.edges().sort_by_distance(p)[0] for p in [
        (0, 204.2, 5.08),
    ]]
    fillet(fillet1_edges, radius=FILLET1_R)


solid = part.part
